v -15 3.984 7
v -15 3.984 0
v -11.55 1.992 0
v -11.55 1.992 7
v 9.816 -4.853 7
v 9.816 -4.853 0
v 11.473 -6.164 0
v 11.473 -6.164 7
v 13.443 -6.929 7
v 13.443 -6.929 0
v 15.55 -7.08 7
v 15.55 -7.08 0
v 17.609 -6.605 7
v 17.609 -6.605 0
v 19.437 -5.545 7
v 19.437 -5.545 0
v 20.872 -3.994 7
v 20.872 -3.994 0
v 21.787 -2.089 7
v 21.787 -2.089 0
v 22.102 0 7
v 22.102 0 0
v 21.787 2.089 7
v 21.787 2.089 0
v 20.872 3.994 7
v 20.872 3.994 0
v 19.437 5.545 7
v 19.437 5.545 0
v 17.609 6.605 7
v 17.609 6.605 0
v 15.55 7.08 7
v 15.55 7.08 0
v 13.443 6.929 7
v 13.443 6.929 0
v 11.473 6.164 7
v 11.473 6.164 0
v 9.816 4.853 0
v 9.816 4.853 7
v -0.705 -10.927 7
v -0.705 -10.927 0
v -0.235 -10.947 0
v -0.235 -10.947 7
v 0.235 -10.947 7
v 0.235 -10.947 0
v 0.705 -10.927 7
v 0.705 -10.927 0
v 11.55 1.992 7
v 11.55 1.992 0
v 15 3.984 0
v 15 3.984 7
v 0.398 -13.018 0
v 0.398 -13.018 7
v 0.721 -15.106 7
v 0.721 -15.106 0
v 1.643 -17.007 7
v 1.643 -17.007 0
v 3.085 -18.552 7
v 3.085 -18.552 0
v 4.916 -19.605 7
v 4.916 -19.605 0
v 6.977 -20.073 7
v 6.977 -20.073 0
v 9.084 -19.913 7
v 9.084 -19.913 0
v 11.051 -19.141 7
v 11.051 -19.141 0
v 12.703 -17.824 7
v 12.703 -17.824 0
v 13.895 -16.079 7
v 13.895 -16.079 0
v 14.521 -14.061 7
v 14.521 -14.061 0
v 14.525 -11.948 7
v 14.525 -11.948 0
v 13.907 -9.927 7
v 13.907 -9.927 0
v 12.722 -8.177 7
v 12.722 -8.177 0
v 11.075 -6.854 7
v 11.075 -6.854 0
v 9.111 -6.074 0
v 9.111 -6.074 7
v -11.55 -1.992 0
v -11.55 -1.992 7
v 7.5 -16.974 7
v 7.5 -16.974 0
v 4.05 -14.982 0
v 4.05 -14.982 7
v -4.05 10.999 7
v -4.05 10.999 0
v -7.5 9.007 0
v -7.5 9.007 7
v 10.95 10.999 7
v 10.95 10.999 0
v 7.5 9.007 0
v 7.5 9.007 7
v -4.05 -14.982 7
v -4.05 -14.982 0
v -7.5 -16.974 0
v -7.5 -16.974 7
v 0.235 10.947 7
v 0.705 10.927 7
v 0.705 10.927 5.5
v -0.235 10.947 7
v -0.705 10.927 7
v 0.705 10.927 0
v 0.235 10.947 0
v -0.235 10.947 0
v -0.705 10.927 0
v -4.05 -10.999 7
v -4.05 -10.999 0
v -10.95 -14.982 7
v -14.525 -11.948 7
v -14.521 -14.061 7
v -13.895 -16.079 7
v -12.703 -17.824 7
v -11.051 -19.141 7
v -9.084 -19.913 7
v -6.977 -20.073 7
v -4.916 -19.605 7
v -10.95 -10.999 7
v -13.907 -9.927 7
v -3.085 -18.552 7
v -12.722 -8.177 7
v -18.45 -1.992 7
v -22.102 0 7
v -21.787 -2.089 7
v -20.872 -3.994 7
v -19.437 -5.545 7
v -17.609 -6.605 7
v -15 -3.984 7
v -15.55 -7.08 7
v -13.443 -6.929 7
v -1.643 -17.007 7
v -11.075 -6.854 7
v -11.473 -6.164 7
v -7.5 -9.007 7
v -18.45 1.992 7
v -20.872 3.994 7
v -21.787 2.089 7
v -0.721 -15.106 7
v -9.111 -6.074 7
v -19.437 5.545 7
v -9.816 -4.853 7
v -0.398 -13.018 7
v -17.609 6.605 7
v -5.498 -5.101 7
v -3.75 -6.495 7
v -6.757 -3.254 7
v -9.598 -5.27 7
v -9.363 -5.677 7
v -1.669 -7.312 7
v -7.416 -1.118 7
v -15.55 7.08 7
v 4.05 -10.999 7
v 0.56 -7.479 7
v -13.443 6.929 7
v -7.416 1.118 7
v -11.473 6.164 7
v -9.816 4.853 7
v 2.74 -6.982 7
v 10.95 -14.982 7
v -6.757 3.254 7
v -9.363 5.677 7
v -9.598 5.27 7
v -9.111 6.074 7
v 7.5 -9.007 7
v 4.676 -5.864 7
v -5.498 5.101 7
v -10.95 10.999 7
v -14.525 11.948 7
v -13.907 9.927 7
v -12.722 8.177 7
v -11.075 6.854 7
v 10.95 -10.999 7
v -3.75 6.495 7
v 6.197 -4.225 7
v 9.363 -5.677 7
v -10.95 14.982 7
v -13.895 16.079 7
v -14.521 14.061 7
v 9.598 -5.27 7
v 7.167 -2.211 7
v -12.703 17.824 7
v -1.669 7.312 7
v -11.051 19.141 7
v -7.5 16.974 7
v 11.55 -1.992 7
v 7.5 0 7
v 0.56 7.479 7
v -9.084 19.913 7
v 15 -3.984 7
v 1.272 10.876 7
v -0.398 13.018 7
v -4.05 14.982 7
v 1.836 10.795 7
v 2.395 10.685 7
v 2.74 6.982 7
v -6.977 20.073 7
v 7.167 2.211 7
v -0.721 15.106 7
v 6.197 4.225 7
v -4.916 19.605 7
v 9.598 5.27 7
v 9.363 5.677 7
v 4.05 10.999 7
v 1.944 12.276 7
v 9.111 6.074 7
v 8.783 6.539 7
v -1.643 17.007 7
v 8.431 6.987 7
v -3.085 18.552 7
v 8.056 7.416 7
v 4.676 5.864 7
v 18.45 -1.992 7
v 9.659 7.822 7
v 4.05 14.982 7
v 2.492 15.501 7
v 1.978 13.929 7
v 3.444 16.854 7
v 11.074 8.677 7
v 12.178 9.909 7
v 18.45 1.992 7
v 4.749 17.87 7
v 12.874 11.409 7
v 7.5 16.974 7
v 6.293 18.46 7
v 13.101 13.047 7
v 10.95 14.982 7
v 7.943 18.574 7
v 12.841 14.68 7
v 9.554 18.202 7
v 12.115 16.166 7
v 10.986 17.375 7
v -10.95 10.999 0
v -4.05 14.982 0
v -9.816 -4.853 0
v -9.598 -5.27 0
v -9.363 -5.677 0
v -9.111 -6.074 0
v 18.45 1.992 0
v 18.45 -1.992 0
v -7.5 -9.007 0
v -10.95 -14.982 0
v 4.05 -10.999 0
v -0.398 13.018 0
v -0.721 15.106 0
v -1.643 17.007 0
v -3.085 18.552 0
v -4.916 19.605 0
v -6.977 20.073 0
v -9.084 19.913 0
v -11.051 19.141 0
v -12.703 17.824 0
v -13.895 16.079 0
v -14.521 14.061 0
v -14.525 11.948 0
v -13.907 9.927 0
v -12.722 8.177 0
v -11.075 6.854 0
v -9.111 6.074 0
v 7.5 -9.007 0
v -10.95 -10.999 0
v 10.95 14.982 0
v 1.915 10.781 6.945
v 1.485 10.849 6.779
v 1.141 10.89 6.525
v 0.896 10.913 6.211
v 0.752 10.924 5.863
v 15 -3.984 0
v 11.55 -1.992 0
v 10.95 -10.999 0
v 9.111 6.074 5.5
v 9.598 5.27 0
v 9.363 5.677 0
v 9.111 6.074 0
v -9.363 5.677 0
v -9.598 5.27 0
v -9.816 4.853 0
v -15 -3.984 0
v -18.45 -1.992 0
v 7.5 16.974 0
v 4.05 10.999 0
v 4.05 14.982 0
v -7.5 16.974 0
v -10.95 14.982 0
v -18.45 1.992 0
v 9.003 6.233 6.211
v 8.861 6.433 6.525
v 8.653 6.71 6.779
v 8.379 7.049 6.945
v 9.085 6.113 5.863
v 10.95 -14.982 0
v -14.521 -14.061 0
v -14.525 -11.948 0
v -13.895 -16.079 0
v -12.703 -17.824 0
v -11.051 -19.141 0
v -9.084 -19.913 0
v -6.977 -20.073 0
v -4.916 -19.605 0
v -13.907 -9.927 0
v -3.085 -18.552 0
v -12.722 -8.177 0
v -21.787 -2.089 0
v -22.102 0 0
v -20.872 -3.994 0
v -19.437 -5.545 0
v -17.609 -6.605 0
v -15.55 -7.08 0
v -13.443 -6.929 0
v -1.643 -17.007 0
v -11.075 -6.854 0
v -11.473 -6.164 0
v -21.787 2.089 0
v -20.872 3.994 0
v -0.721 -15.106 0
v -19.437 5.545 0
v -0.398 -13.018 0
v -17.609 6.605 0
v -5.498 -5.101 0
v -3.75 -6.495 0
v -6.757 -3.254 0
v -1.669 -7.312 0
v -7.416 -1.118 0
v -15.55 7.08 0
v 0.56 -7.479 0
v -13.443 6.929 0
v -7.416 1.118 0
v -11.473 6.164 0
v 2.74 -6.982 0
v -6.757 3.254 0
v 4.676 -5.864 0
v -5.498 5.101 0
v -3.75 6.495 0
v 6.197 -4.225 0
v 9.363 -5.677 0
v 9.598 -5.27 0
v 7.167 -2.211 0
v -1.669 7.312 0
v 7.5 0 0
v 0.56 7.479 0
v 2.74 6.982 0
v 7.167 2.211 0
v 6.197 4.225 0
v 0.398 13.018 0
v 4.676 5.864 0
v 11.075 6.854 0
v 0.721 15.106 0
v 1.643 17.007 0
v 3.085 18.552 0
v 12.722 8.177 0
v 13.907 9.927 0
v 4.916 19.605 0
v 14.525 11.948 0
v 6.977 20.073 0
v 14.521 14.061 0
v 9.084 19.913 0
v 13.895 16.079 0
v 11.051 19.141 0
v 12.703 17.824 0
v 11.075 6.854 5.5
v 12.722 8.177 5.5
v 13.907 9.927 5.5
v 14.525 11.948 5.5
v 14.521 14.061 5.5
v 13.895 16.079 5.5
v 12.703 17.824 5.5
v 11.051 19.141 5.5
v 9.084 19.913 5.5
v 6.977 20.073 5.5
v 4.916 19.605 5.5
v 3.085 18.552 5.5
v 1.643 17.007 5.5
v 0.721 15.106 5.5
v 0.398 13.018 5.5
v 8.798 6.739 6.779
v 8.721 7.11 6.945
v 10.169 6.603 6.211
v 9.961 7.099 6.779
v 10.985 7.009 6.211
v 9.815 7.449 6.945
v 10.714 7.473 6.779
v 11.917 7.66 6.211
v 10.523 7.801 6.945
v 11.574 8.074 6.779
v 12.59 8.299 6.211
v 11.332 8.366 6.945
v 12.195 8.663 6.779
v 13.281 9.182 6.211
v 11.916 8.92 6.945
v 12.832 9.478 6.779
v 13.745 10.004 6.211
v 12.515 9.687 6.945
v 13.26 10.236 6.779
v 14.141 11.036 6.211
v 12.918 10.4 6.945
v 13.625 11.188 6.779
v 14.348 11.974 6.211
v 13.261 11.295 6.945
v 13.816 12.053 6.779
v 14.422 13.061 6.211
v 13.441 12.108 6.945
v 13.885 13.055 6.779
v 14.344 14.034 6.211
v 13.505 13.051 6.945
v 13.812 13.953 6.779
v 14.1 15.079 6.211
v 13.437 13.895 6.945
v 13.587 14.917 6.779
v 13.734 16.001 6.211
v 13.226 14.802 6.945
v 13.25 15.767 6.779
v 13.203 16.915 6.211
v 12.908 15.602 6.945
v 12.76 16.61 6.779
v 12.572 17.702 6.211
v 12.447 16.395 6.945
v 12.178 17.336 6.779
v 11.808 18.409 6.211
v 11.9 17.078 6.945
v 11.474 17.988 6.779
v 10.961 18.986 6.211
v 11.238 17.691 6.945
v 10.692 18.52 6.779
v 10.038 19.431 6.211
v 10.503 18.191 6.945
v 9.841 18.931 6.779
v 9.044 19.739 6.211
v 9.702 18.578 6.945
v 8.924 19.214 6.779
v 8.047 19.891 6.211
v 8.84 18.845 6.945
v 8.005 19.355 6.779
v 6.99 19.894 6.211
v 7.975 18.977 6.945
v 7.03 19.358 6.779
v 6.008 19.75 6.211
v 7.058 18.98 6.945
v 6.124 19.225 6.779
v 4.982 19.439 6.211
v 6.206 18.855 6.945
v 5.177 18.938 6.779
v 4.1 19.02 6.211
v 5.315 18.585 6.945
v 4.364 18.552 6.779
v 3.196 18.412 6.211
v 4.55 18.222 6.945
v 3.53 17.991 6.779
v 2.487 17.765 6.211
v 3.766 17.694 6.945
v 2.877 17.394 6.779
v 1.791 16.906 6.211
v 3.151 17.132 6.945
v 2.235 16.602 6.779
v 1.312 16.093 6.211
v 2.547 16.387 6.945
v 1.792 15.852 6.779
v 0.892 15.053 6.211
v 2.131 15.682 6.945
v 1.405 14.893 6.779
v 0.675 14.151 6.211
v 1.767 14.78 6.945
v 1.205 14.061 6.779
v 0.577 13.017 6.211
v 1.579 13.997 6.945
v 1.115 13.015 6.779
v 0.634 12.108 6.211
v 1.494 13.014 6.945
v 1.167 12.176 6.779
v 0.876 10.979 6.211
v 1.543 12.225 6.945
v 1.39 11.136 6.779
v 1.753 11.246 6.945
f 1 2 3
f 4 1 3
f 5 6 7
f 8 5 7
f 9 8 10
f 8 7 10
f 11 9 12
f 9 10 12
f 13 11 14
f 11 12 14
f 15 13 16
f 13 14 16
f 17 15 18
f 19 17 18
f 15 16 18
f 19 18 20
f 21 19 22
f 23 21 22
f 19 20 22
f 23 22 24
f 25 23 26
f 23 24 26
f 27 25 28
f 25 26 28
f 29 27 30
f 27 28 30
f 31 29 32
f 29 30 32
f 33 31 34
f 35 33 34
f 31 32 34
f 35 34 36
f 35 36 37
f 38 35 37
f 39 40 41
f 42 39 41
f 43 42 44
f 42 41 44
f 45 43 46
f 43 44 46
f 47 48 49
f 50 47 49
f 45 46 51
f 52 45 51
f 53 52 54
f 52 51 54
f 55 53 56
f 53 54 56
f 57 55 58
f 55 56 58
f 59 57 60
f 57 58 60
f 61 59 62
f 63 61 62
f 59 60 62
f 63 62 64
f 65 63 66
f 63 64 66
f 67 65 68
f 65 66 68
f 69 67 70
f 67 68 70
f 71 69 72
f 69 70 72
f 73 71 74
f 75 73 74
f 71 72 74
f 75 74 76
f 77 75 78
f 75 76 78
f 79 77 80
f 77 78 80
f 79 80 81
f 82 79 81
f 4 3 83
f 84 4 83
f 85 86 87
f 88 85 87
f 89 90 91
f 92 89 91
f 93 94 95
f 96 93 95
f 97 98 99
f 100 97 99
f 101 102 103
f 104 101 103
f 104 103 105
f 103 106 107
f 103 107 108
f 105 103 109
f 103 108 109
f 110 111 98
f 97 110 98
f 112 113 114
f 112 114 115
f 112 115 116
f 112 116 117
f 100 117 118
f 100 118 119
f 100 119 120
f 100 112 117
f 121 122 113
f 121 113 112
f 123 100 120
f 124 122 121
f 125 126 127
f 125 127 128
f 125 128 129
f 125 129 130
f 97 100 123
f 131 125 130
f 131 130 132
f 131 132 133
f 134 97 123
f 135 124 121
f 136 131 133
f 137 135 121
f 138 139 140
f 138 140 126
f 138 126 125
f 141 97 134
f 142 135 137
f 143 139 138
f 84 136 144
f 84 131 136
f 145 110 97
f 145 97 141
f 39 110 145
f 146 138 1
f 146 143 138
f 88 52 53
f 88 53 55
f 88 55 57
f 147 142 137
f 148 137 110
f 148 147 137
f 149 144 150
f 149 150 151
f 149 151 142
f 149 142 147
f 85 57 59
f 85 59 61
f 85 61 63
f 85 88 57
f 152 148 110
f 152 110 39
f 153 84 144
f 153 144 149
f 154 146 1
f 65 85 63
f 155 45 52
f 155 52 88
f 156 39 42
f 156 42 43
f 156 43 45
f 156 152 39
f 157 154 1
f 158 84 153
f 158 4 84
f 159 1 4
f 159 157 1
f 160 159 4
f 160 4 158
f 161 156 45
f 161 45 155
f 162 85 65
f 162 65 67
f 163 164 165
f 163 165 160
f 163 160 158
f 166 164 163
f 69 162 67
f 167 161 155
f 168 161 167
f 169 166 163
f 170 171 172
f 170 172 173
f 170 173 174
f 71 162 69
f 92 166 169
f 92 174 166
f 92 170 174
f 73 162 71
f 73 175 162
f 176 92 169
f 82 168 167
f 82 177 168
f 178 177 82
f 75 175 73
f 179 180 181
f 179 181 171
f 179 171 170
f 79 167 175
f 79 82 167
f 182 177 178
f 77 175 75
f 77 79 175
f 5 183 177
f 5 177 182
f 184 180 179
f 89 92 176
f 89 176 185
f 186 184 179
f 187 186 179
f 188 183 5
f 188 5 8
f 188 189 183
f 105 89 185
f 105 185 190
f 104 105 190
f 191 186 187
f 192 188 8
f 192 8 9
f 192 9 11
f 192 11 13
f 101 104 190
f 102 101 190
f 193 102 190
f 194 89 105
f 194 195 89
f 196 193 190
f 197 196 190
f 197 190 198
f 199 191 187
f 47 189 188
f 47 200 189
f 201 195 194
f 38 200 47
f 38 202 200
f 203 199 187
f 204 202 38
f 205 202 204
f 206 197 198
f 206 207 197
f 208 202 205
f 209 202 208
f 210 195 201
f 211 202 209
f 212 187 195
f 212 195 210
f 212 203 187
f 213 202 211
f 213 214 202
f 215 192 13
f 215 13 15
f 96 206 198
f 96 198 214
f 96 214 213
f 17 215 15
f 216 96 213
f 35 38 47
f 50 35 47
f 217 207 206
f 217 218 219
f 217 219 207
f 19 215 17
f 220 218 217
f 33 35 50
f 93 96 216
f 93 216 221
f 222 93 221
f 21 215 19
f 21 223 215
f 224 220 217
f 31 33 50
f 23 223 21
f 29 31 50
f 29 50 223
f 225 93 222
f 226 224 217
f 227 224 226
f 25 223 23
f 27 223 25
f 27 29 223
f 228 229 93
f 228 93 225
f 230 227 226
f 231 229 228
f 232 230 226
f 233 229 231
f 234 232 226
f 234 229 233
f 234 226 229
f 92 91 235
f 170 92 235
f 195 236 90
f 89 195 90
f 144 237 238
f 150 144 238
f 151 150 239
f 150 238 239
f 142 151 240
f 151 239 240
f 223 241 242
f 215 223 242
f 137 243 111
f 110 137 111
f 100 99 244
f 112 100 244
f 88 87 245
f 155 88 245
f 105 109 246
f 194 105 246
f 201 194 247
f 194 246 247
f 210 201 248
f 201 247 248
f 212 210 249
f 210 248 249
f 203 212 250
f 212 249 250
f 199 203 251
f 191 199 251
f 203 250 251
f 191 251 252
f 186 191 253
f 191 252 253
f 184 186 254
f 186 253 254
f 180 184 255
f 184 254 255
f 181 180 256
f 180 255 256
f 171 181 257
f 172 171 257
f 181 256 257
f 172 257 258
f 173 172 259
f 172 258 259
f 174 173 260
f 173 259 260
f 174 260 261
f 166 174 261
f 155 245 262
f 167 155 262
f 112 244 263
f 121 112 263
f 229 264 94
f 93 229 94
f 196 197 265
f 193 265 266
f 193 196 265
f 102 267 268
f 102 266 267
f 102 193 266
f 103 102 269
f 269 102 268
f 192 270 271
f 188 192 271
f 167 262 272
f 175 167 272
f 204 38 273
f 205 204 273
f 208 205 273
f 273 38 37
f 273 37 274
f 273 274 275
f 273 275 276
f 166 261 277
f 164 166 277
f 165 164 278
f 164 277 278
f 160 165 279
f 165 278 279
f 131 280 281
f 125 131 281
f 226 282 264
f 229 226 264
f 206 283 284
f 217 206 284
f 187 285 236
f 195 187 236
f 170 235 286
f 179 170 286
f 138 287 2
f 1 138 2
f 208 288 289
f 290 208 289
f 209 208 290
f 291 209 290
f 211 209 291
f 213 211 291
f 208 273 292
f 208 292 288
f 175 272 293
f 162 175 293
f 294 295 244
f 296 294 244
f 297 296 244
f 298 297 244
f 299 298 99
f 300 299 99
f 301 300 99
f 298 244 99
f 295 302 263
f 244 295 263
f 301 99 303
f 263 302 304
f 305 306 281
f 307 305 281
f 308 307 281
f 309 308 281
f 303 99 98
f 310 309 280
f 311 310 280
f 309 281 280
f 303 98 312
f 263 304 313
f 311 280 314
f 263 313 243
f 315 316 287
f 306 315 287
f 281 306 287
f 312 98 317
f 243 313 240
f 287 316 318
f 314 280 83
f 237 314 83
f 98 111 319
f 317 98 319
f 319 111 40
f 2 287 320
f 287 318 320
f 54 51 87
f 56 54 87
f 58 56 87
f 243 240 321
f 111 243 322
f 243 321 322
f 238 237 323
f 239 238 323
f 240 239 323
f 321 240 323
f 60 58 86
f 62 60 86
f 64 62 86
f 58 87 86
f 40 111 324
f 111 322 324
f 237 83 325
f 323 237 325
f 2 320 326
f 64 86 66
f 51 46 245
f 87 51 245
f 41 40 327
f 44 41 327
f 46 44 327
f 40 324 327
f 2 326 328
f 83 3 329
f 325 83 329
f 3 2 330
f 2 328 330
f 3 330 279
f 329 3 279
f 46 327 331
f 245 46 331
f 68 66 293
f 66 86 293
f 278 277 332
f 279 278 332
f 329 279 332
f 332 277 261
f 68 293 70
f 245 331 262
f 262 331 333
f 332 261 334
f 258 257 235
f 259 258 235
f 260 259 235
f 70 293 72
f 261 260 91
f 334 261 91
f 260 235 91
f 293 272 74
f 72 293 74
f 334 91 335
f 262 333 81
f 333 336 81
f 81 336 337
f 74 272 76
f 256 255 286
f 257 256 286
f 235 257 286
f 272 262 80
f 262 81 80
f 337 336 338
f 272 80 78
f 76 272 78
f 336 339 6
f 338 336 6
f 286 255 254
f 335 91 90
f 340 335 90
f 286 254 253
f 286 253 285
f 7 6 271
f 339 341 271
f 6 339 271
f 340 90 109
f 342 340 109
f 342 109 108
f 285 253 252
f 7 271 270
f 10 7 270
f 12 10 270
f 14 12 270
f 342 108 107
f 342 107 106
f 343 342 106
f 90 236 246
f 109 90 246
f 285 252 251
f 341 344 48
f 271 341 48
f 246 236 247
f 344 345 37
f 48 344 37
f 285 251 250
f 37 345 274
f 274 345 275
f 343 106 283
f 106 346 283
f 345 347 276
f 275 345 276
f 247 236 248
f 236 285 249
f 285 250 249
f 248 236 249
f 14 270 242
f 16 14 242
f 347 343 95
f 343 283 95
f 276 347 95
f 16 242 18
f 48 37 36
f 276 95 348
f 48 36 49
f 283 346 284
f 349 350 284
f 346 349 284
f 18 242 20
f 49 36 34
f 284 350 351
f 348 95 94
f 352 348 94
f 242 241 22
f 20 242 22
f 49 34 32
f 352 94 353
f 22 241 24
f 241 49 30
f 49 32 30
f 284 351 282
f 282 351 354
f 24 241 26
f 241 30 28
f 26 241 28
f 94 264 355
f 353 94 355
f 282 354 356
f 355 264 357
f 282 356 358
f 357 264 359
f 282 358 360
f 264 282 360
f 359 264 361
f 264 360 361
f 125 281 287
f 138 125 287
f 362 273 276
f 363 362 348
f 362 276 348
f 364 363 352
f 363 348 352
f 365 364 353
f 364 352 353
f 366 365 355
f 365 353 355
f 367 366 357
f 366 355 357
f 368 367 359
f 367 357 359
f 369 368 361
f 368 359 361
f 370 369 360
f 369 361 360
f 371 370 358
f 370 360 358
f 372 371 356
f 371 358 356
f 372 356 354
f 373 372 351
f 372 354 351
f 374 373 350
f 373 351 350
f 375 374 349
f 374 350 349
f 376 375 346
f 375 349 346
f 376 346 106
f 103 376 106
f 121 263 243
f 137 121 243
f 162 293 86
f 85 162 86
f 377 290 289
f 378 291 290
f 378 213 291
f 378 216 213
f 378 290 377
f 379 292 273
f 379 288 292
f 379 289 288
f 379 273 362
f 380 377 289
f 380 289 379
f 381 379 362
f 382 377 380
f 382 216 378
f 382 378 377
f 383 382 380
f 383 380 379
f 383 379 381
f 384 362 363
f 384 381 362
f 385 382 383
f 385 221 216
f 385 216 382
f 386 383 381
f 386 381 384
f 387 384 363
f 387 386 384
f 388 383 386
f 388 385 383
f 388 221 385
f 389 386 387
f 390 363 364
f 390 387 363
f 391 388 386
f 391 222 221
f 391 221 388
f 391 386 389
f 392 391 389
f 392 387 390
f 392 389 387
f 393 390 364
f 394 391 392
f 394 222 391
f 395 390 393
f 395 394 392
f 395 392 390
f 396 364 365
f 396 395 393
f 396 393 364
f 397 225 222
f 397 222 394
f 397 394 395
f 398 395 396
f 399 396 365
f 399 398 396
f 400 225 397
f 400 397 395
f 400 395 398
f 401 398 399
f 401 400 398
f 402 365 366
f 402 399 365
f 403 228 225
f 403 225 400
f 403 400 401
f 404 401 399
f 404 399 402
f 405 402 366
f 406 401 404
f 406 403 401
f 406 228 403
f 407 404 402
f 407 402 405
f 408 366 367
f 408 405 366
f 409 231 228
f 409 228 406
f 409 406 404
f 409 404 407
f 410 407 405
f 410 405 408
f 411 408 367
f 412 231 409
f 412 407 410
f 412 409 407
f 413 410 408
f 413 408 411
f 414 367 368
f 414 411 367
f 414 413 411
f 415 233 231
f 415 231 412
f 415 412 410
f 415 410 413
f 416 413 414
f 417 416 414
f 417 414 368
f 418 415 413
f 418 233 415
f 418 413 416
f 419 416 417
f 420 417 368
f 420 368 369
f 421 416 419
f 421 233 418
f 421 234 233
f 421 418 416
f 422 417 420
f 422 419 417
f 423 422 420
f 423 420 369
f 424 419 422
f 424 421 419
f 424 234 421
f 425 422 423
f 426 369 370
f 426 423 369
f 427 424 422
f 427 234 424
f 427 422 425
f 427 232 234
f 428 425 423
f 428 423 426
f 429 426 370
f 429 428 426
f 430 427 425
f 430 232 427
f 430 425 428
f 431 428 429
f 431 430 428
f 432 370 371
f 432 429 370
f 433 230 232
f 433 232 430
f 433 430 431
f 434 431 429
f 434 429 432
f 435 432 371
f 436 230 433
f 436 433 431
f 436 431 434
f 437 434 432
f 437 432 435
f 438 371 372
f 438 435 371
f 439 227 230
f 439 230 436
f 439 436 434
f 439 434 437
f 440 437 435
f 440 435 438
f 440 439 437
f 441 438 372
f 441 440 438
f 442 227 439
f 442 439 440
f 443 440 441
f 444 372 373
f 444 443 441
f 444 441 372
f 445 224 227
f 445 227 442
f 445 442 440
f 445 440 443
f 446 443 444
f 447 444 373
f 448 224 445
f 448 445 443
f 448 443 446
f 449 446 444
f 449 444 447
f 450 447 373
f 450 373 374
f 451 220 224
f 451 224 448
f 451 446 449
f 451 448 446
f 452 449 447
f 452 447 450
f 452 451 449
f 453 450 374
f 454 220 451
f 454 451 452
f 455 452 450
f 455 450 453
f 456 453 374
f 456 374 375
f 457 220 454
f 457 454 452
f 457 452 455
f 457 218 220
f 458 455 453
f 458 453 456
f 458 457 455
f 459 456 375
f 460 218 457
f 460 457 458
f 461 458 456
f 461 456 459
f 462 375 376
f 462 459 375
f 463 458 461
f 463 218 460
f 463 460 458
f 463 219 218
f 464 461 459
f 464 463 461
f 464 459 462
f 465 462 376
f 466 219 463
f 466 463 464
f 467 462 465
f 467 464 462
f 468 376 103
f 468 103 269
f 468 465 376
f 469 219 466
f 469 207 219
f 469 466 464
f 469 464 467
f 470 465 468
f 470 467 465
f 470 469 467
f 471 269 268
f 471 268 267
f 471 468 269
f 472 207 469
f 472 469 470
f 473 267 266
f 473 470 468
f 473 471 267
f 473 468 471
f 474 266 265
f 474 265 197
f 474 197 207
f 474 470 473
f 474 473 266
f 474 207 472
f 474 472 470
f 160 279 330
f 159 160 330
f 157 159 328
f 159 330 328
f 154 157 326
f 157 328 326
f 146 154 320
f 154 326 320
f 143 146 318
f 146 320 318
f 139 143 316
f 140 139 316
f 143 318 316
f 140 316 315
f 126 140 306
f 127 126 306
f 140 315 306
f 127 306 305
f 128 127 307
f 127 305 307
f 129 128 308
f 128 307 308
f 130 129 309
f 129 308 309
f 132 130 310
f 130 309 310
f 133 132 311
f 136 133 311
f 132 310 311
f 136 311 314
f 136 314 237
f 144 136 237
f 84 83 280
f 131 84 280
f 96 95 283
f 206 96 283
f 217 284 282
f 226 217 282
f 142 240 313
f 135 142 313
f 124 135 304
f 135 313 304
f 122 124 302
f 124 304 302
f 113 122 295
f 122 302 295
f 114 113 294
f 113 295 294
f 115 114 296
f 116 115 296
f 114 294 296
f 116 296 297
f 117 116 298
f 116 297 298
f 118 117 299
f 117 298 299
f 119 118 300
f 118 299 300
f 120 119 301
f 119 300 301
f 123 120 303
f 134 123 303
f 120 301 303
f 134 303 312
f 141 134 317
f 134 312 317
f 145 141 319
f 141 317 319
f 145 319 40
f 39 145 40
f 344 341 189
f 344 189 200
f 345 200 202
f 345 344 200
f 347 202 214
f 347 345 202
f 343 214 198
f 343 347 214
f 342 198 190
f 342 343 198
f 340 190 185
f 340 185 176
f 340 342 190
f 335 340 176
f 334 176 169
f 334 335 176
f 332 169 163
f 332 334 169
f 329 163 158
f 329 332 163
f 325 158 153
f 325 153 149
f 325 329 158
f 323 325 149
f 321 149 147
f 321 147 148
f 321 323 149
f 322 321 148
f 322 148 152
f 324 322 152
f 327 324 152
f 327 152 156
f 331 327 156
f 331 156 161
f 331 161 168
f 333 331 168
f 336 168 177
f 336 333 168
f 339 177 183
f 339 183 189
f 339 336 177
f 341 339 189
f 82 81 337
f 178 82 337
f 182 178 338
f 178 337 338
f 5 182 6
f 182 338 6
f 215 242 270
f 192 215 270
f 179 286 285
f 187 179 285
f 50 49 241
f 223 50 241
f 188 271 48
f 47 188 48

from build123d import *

# Parameters (mm, degrees)
F0_R        = 7.5
F1_DEPTH    = 7
F2_T4_ANGLE = 334.5116796515
F2_S5_R     = 10.95
F2_T6_DEPTH = 12


# Not quite as in the source:
# - a fillet or chamfer that OpenCascade refuses, or shapes differently, is made with other operations: its cross-section is extruded or revolved along the edge and cut away or added


with BuildPart() as f1:
    # F0 (on Top) → F1 (new body)
    with BuildSketch(Plane.XY):
        with BuildLine():
            ThreePointArc((-9.8156361058, 4.8534305226), (-22.1016488807, 0), (-9.8156361058, -4.8534305226))
            ThreePointArc((-9.8156361058, -4.8534305226), (-9.4829781714, -5.475), (-9.111012181, -6.0738749607))
            ThreePointArc((-9.111012181, -6.0738749607), (-11.0508244404, -19.1405893962), (-0.7046239248, -10.9273054833))
            ThreePointArc((-0.7046239248, -10.9273054833), (0, -10.95), (0.7046239248, -10.9273054833))
            ThreePointArc((0.7046239248, -10.9273054833), (11.0508244404, -19.1405893962), (9.111012181, -6.0738749607))
            ThreePointArc((9.111012181, -6.0738749607), (9.4829781714, -5.475), (9.8156361058, -4.8534305226))
            ThreePointArc((9.8156361058, -4.8534305226), (22.1016488807, 0), (9.8156361058, 4.8534305226))
            ThreePointArc((9.8156361058, 4.8534305226), (9.4829781714, 5.475), (9.111012181, 6.0738749607))
            ThreePointArc((9.111012181, 6.0738749607), (11.0508244404, 19.1405893962), (0.7046239248, 10.9273054833))
            ThreePointArc((0.7046239248, 10.9273054833), (0, 10.95), (-0.7046239248, 10.9273054833))
            ThreePointArc((-0.7046239248, 10.9273054833), (-11.0508244404, 19.1405893962), (-9.111012181, 6.0738749607))
            ThreePointArc((-9.111012181, 6.0738749607), (-9.4829781714, 5.475), (-9.8156361058, 4.8534305226))
        make_face()
        Polygon((-4.05, -14.9822394855), (-7.5, -16.9740979142), (-10.95, -14.9822394855), (-10.95, -10.9985226281), (-7.5, -9.0066641994), (-4.05, -10.9985226281), align=None, mode=Mode.SUBTRACT)
        Polygon((10.95, -10.9985226281), (10.95, -14.9822394855), (7.5, -16.9740979142), (4.05, -14.9822394855), (4.05, -10.9985226281), (7.5, -9.0066641994), align=None, mode=Mode.SUBTRACT)
        Polygon((-15, 3.9837168574), (-11.55, 1.9918584287), (-11.55, -1.9918584287), (-15, -3.9837168574), (-18.45, -1.9918584287), (-18.45, 1.9918584287), align=None, mode=Mode.SUBTRACT)
        Polygon((-10.95, 10.9985226281), (-10.95, 14.9822394855), (-7.5, 16.9740979142), (-4.05, 14.9822394855), (-4.05, 10.9985226281), (-7.5, 9.0066641994), align=None, mode=Mode.SUBTRACT)
        Circle(F0_R, mode=Mode.SUBTRACT)
        Polygon((15, 3.9837168574), (18.45, 1.9918584287), (18.45, -1.9918584287), (15, -3.9837168574), (11.55, -1.9918584287), (11.55, 1.9918584287), align=None, mode=Mode.SUBTRACT)
        Polygon((4.05, 14.9822394855), (7.5, 16.9740979142), (10.95, 14.9822394855), (10.95, 10.9985226281), (7.5, 9.0066641994), (4.05, 10.9985226281), align=None, mode=Mode.SUBTRACT)
    extrude(amount=F1_DEPTH)

    # F2: fillet of radius 1.5 on 1 edges, made by hand


with BuildPart() as f2_tool2:
    # F2_s3 → F2_t4 (revolve)
    with BuildSketch(Plane(origin=(3.1600326445, -0.9815693661, 0), x_dir=(0, 0, 1), z_dir=(-0.9549897147, 0.2966389131, 0))):
        with BuildLine():
            ThreePointArc((5.5, 7.528823267), (6.5606601718, 7.9681630952), (7, 9.028823267))
            Line((7, 9.028823267), (7, 7.528823267))
            Line((7, 7.528823267), (5.5, 7.528823267))
        make_face()
    revolve(axis=Axis((7.5, 12.9903810568, 7), (0, 0, 1)), revolution_arc=F2_T4_ANGLE)

    # F2_s5 → F2_t6 (cut, symmetric)
    with BuildSketch(Plane.XY.offset(6.2)):
        Circle(F2_S5_R)
    extrude(amount=F2_T6_DEPTH, both=True, mode=Mode.SUBTRACT)


with BuildPart() as f1_1:
    add(f1.part)

    # F2_t1: cut F2_tool2
    add(f2_tool2.part, mode=Mode.SUBTRACT)


solid = f1_1.part
